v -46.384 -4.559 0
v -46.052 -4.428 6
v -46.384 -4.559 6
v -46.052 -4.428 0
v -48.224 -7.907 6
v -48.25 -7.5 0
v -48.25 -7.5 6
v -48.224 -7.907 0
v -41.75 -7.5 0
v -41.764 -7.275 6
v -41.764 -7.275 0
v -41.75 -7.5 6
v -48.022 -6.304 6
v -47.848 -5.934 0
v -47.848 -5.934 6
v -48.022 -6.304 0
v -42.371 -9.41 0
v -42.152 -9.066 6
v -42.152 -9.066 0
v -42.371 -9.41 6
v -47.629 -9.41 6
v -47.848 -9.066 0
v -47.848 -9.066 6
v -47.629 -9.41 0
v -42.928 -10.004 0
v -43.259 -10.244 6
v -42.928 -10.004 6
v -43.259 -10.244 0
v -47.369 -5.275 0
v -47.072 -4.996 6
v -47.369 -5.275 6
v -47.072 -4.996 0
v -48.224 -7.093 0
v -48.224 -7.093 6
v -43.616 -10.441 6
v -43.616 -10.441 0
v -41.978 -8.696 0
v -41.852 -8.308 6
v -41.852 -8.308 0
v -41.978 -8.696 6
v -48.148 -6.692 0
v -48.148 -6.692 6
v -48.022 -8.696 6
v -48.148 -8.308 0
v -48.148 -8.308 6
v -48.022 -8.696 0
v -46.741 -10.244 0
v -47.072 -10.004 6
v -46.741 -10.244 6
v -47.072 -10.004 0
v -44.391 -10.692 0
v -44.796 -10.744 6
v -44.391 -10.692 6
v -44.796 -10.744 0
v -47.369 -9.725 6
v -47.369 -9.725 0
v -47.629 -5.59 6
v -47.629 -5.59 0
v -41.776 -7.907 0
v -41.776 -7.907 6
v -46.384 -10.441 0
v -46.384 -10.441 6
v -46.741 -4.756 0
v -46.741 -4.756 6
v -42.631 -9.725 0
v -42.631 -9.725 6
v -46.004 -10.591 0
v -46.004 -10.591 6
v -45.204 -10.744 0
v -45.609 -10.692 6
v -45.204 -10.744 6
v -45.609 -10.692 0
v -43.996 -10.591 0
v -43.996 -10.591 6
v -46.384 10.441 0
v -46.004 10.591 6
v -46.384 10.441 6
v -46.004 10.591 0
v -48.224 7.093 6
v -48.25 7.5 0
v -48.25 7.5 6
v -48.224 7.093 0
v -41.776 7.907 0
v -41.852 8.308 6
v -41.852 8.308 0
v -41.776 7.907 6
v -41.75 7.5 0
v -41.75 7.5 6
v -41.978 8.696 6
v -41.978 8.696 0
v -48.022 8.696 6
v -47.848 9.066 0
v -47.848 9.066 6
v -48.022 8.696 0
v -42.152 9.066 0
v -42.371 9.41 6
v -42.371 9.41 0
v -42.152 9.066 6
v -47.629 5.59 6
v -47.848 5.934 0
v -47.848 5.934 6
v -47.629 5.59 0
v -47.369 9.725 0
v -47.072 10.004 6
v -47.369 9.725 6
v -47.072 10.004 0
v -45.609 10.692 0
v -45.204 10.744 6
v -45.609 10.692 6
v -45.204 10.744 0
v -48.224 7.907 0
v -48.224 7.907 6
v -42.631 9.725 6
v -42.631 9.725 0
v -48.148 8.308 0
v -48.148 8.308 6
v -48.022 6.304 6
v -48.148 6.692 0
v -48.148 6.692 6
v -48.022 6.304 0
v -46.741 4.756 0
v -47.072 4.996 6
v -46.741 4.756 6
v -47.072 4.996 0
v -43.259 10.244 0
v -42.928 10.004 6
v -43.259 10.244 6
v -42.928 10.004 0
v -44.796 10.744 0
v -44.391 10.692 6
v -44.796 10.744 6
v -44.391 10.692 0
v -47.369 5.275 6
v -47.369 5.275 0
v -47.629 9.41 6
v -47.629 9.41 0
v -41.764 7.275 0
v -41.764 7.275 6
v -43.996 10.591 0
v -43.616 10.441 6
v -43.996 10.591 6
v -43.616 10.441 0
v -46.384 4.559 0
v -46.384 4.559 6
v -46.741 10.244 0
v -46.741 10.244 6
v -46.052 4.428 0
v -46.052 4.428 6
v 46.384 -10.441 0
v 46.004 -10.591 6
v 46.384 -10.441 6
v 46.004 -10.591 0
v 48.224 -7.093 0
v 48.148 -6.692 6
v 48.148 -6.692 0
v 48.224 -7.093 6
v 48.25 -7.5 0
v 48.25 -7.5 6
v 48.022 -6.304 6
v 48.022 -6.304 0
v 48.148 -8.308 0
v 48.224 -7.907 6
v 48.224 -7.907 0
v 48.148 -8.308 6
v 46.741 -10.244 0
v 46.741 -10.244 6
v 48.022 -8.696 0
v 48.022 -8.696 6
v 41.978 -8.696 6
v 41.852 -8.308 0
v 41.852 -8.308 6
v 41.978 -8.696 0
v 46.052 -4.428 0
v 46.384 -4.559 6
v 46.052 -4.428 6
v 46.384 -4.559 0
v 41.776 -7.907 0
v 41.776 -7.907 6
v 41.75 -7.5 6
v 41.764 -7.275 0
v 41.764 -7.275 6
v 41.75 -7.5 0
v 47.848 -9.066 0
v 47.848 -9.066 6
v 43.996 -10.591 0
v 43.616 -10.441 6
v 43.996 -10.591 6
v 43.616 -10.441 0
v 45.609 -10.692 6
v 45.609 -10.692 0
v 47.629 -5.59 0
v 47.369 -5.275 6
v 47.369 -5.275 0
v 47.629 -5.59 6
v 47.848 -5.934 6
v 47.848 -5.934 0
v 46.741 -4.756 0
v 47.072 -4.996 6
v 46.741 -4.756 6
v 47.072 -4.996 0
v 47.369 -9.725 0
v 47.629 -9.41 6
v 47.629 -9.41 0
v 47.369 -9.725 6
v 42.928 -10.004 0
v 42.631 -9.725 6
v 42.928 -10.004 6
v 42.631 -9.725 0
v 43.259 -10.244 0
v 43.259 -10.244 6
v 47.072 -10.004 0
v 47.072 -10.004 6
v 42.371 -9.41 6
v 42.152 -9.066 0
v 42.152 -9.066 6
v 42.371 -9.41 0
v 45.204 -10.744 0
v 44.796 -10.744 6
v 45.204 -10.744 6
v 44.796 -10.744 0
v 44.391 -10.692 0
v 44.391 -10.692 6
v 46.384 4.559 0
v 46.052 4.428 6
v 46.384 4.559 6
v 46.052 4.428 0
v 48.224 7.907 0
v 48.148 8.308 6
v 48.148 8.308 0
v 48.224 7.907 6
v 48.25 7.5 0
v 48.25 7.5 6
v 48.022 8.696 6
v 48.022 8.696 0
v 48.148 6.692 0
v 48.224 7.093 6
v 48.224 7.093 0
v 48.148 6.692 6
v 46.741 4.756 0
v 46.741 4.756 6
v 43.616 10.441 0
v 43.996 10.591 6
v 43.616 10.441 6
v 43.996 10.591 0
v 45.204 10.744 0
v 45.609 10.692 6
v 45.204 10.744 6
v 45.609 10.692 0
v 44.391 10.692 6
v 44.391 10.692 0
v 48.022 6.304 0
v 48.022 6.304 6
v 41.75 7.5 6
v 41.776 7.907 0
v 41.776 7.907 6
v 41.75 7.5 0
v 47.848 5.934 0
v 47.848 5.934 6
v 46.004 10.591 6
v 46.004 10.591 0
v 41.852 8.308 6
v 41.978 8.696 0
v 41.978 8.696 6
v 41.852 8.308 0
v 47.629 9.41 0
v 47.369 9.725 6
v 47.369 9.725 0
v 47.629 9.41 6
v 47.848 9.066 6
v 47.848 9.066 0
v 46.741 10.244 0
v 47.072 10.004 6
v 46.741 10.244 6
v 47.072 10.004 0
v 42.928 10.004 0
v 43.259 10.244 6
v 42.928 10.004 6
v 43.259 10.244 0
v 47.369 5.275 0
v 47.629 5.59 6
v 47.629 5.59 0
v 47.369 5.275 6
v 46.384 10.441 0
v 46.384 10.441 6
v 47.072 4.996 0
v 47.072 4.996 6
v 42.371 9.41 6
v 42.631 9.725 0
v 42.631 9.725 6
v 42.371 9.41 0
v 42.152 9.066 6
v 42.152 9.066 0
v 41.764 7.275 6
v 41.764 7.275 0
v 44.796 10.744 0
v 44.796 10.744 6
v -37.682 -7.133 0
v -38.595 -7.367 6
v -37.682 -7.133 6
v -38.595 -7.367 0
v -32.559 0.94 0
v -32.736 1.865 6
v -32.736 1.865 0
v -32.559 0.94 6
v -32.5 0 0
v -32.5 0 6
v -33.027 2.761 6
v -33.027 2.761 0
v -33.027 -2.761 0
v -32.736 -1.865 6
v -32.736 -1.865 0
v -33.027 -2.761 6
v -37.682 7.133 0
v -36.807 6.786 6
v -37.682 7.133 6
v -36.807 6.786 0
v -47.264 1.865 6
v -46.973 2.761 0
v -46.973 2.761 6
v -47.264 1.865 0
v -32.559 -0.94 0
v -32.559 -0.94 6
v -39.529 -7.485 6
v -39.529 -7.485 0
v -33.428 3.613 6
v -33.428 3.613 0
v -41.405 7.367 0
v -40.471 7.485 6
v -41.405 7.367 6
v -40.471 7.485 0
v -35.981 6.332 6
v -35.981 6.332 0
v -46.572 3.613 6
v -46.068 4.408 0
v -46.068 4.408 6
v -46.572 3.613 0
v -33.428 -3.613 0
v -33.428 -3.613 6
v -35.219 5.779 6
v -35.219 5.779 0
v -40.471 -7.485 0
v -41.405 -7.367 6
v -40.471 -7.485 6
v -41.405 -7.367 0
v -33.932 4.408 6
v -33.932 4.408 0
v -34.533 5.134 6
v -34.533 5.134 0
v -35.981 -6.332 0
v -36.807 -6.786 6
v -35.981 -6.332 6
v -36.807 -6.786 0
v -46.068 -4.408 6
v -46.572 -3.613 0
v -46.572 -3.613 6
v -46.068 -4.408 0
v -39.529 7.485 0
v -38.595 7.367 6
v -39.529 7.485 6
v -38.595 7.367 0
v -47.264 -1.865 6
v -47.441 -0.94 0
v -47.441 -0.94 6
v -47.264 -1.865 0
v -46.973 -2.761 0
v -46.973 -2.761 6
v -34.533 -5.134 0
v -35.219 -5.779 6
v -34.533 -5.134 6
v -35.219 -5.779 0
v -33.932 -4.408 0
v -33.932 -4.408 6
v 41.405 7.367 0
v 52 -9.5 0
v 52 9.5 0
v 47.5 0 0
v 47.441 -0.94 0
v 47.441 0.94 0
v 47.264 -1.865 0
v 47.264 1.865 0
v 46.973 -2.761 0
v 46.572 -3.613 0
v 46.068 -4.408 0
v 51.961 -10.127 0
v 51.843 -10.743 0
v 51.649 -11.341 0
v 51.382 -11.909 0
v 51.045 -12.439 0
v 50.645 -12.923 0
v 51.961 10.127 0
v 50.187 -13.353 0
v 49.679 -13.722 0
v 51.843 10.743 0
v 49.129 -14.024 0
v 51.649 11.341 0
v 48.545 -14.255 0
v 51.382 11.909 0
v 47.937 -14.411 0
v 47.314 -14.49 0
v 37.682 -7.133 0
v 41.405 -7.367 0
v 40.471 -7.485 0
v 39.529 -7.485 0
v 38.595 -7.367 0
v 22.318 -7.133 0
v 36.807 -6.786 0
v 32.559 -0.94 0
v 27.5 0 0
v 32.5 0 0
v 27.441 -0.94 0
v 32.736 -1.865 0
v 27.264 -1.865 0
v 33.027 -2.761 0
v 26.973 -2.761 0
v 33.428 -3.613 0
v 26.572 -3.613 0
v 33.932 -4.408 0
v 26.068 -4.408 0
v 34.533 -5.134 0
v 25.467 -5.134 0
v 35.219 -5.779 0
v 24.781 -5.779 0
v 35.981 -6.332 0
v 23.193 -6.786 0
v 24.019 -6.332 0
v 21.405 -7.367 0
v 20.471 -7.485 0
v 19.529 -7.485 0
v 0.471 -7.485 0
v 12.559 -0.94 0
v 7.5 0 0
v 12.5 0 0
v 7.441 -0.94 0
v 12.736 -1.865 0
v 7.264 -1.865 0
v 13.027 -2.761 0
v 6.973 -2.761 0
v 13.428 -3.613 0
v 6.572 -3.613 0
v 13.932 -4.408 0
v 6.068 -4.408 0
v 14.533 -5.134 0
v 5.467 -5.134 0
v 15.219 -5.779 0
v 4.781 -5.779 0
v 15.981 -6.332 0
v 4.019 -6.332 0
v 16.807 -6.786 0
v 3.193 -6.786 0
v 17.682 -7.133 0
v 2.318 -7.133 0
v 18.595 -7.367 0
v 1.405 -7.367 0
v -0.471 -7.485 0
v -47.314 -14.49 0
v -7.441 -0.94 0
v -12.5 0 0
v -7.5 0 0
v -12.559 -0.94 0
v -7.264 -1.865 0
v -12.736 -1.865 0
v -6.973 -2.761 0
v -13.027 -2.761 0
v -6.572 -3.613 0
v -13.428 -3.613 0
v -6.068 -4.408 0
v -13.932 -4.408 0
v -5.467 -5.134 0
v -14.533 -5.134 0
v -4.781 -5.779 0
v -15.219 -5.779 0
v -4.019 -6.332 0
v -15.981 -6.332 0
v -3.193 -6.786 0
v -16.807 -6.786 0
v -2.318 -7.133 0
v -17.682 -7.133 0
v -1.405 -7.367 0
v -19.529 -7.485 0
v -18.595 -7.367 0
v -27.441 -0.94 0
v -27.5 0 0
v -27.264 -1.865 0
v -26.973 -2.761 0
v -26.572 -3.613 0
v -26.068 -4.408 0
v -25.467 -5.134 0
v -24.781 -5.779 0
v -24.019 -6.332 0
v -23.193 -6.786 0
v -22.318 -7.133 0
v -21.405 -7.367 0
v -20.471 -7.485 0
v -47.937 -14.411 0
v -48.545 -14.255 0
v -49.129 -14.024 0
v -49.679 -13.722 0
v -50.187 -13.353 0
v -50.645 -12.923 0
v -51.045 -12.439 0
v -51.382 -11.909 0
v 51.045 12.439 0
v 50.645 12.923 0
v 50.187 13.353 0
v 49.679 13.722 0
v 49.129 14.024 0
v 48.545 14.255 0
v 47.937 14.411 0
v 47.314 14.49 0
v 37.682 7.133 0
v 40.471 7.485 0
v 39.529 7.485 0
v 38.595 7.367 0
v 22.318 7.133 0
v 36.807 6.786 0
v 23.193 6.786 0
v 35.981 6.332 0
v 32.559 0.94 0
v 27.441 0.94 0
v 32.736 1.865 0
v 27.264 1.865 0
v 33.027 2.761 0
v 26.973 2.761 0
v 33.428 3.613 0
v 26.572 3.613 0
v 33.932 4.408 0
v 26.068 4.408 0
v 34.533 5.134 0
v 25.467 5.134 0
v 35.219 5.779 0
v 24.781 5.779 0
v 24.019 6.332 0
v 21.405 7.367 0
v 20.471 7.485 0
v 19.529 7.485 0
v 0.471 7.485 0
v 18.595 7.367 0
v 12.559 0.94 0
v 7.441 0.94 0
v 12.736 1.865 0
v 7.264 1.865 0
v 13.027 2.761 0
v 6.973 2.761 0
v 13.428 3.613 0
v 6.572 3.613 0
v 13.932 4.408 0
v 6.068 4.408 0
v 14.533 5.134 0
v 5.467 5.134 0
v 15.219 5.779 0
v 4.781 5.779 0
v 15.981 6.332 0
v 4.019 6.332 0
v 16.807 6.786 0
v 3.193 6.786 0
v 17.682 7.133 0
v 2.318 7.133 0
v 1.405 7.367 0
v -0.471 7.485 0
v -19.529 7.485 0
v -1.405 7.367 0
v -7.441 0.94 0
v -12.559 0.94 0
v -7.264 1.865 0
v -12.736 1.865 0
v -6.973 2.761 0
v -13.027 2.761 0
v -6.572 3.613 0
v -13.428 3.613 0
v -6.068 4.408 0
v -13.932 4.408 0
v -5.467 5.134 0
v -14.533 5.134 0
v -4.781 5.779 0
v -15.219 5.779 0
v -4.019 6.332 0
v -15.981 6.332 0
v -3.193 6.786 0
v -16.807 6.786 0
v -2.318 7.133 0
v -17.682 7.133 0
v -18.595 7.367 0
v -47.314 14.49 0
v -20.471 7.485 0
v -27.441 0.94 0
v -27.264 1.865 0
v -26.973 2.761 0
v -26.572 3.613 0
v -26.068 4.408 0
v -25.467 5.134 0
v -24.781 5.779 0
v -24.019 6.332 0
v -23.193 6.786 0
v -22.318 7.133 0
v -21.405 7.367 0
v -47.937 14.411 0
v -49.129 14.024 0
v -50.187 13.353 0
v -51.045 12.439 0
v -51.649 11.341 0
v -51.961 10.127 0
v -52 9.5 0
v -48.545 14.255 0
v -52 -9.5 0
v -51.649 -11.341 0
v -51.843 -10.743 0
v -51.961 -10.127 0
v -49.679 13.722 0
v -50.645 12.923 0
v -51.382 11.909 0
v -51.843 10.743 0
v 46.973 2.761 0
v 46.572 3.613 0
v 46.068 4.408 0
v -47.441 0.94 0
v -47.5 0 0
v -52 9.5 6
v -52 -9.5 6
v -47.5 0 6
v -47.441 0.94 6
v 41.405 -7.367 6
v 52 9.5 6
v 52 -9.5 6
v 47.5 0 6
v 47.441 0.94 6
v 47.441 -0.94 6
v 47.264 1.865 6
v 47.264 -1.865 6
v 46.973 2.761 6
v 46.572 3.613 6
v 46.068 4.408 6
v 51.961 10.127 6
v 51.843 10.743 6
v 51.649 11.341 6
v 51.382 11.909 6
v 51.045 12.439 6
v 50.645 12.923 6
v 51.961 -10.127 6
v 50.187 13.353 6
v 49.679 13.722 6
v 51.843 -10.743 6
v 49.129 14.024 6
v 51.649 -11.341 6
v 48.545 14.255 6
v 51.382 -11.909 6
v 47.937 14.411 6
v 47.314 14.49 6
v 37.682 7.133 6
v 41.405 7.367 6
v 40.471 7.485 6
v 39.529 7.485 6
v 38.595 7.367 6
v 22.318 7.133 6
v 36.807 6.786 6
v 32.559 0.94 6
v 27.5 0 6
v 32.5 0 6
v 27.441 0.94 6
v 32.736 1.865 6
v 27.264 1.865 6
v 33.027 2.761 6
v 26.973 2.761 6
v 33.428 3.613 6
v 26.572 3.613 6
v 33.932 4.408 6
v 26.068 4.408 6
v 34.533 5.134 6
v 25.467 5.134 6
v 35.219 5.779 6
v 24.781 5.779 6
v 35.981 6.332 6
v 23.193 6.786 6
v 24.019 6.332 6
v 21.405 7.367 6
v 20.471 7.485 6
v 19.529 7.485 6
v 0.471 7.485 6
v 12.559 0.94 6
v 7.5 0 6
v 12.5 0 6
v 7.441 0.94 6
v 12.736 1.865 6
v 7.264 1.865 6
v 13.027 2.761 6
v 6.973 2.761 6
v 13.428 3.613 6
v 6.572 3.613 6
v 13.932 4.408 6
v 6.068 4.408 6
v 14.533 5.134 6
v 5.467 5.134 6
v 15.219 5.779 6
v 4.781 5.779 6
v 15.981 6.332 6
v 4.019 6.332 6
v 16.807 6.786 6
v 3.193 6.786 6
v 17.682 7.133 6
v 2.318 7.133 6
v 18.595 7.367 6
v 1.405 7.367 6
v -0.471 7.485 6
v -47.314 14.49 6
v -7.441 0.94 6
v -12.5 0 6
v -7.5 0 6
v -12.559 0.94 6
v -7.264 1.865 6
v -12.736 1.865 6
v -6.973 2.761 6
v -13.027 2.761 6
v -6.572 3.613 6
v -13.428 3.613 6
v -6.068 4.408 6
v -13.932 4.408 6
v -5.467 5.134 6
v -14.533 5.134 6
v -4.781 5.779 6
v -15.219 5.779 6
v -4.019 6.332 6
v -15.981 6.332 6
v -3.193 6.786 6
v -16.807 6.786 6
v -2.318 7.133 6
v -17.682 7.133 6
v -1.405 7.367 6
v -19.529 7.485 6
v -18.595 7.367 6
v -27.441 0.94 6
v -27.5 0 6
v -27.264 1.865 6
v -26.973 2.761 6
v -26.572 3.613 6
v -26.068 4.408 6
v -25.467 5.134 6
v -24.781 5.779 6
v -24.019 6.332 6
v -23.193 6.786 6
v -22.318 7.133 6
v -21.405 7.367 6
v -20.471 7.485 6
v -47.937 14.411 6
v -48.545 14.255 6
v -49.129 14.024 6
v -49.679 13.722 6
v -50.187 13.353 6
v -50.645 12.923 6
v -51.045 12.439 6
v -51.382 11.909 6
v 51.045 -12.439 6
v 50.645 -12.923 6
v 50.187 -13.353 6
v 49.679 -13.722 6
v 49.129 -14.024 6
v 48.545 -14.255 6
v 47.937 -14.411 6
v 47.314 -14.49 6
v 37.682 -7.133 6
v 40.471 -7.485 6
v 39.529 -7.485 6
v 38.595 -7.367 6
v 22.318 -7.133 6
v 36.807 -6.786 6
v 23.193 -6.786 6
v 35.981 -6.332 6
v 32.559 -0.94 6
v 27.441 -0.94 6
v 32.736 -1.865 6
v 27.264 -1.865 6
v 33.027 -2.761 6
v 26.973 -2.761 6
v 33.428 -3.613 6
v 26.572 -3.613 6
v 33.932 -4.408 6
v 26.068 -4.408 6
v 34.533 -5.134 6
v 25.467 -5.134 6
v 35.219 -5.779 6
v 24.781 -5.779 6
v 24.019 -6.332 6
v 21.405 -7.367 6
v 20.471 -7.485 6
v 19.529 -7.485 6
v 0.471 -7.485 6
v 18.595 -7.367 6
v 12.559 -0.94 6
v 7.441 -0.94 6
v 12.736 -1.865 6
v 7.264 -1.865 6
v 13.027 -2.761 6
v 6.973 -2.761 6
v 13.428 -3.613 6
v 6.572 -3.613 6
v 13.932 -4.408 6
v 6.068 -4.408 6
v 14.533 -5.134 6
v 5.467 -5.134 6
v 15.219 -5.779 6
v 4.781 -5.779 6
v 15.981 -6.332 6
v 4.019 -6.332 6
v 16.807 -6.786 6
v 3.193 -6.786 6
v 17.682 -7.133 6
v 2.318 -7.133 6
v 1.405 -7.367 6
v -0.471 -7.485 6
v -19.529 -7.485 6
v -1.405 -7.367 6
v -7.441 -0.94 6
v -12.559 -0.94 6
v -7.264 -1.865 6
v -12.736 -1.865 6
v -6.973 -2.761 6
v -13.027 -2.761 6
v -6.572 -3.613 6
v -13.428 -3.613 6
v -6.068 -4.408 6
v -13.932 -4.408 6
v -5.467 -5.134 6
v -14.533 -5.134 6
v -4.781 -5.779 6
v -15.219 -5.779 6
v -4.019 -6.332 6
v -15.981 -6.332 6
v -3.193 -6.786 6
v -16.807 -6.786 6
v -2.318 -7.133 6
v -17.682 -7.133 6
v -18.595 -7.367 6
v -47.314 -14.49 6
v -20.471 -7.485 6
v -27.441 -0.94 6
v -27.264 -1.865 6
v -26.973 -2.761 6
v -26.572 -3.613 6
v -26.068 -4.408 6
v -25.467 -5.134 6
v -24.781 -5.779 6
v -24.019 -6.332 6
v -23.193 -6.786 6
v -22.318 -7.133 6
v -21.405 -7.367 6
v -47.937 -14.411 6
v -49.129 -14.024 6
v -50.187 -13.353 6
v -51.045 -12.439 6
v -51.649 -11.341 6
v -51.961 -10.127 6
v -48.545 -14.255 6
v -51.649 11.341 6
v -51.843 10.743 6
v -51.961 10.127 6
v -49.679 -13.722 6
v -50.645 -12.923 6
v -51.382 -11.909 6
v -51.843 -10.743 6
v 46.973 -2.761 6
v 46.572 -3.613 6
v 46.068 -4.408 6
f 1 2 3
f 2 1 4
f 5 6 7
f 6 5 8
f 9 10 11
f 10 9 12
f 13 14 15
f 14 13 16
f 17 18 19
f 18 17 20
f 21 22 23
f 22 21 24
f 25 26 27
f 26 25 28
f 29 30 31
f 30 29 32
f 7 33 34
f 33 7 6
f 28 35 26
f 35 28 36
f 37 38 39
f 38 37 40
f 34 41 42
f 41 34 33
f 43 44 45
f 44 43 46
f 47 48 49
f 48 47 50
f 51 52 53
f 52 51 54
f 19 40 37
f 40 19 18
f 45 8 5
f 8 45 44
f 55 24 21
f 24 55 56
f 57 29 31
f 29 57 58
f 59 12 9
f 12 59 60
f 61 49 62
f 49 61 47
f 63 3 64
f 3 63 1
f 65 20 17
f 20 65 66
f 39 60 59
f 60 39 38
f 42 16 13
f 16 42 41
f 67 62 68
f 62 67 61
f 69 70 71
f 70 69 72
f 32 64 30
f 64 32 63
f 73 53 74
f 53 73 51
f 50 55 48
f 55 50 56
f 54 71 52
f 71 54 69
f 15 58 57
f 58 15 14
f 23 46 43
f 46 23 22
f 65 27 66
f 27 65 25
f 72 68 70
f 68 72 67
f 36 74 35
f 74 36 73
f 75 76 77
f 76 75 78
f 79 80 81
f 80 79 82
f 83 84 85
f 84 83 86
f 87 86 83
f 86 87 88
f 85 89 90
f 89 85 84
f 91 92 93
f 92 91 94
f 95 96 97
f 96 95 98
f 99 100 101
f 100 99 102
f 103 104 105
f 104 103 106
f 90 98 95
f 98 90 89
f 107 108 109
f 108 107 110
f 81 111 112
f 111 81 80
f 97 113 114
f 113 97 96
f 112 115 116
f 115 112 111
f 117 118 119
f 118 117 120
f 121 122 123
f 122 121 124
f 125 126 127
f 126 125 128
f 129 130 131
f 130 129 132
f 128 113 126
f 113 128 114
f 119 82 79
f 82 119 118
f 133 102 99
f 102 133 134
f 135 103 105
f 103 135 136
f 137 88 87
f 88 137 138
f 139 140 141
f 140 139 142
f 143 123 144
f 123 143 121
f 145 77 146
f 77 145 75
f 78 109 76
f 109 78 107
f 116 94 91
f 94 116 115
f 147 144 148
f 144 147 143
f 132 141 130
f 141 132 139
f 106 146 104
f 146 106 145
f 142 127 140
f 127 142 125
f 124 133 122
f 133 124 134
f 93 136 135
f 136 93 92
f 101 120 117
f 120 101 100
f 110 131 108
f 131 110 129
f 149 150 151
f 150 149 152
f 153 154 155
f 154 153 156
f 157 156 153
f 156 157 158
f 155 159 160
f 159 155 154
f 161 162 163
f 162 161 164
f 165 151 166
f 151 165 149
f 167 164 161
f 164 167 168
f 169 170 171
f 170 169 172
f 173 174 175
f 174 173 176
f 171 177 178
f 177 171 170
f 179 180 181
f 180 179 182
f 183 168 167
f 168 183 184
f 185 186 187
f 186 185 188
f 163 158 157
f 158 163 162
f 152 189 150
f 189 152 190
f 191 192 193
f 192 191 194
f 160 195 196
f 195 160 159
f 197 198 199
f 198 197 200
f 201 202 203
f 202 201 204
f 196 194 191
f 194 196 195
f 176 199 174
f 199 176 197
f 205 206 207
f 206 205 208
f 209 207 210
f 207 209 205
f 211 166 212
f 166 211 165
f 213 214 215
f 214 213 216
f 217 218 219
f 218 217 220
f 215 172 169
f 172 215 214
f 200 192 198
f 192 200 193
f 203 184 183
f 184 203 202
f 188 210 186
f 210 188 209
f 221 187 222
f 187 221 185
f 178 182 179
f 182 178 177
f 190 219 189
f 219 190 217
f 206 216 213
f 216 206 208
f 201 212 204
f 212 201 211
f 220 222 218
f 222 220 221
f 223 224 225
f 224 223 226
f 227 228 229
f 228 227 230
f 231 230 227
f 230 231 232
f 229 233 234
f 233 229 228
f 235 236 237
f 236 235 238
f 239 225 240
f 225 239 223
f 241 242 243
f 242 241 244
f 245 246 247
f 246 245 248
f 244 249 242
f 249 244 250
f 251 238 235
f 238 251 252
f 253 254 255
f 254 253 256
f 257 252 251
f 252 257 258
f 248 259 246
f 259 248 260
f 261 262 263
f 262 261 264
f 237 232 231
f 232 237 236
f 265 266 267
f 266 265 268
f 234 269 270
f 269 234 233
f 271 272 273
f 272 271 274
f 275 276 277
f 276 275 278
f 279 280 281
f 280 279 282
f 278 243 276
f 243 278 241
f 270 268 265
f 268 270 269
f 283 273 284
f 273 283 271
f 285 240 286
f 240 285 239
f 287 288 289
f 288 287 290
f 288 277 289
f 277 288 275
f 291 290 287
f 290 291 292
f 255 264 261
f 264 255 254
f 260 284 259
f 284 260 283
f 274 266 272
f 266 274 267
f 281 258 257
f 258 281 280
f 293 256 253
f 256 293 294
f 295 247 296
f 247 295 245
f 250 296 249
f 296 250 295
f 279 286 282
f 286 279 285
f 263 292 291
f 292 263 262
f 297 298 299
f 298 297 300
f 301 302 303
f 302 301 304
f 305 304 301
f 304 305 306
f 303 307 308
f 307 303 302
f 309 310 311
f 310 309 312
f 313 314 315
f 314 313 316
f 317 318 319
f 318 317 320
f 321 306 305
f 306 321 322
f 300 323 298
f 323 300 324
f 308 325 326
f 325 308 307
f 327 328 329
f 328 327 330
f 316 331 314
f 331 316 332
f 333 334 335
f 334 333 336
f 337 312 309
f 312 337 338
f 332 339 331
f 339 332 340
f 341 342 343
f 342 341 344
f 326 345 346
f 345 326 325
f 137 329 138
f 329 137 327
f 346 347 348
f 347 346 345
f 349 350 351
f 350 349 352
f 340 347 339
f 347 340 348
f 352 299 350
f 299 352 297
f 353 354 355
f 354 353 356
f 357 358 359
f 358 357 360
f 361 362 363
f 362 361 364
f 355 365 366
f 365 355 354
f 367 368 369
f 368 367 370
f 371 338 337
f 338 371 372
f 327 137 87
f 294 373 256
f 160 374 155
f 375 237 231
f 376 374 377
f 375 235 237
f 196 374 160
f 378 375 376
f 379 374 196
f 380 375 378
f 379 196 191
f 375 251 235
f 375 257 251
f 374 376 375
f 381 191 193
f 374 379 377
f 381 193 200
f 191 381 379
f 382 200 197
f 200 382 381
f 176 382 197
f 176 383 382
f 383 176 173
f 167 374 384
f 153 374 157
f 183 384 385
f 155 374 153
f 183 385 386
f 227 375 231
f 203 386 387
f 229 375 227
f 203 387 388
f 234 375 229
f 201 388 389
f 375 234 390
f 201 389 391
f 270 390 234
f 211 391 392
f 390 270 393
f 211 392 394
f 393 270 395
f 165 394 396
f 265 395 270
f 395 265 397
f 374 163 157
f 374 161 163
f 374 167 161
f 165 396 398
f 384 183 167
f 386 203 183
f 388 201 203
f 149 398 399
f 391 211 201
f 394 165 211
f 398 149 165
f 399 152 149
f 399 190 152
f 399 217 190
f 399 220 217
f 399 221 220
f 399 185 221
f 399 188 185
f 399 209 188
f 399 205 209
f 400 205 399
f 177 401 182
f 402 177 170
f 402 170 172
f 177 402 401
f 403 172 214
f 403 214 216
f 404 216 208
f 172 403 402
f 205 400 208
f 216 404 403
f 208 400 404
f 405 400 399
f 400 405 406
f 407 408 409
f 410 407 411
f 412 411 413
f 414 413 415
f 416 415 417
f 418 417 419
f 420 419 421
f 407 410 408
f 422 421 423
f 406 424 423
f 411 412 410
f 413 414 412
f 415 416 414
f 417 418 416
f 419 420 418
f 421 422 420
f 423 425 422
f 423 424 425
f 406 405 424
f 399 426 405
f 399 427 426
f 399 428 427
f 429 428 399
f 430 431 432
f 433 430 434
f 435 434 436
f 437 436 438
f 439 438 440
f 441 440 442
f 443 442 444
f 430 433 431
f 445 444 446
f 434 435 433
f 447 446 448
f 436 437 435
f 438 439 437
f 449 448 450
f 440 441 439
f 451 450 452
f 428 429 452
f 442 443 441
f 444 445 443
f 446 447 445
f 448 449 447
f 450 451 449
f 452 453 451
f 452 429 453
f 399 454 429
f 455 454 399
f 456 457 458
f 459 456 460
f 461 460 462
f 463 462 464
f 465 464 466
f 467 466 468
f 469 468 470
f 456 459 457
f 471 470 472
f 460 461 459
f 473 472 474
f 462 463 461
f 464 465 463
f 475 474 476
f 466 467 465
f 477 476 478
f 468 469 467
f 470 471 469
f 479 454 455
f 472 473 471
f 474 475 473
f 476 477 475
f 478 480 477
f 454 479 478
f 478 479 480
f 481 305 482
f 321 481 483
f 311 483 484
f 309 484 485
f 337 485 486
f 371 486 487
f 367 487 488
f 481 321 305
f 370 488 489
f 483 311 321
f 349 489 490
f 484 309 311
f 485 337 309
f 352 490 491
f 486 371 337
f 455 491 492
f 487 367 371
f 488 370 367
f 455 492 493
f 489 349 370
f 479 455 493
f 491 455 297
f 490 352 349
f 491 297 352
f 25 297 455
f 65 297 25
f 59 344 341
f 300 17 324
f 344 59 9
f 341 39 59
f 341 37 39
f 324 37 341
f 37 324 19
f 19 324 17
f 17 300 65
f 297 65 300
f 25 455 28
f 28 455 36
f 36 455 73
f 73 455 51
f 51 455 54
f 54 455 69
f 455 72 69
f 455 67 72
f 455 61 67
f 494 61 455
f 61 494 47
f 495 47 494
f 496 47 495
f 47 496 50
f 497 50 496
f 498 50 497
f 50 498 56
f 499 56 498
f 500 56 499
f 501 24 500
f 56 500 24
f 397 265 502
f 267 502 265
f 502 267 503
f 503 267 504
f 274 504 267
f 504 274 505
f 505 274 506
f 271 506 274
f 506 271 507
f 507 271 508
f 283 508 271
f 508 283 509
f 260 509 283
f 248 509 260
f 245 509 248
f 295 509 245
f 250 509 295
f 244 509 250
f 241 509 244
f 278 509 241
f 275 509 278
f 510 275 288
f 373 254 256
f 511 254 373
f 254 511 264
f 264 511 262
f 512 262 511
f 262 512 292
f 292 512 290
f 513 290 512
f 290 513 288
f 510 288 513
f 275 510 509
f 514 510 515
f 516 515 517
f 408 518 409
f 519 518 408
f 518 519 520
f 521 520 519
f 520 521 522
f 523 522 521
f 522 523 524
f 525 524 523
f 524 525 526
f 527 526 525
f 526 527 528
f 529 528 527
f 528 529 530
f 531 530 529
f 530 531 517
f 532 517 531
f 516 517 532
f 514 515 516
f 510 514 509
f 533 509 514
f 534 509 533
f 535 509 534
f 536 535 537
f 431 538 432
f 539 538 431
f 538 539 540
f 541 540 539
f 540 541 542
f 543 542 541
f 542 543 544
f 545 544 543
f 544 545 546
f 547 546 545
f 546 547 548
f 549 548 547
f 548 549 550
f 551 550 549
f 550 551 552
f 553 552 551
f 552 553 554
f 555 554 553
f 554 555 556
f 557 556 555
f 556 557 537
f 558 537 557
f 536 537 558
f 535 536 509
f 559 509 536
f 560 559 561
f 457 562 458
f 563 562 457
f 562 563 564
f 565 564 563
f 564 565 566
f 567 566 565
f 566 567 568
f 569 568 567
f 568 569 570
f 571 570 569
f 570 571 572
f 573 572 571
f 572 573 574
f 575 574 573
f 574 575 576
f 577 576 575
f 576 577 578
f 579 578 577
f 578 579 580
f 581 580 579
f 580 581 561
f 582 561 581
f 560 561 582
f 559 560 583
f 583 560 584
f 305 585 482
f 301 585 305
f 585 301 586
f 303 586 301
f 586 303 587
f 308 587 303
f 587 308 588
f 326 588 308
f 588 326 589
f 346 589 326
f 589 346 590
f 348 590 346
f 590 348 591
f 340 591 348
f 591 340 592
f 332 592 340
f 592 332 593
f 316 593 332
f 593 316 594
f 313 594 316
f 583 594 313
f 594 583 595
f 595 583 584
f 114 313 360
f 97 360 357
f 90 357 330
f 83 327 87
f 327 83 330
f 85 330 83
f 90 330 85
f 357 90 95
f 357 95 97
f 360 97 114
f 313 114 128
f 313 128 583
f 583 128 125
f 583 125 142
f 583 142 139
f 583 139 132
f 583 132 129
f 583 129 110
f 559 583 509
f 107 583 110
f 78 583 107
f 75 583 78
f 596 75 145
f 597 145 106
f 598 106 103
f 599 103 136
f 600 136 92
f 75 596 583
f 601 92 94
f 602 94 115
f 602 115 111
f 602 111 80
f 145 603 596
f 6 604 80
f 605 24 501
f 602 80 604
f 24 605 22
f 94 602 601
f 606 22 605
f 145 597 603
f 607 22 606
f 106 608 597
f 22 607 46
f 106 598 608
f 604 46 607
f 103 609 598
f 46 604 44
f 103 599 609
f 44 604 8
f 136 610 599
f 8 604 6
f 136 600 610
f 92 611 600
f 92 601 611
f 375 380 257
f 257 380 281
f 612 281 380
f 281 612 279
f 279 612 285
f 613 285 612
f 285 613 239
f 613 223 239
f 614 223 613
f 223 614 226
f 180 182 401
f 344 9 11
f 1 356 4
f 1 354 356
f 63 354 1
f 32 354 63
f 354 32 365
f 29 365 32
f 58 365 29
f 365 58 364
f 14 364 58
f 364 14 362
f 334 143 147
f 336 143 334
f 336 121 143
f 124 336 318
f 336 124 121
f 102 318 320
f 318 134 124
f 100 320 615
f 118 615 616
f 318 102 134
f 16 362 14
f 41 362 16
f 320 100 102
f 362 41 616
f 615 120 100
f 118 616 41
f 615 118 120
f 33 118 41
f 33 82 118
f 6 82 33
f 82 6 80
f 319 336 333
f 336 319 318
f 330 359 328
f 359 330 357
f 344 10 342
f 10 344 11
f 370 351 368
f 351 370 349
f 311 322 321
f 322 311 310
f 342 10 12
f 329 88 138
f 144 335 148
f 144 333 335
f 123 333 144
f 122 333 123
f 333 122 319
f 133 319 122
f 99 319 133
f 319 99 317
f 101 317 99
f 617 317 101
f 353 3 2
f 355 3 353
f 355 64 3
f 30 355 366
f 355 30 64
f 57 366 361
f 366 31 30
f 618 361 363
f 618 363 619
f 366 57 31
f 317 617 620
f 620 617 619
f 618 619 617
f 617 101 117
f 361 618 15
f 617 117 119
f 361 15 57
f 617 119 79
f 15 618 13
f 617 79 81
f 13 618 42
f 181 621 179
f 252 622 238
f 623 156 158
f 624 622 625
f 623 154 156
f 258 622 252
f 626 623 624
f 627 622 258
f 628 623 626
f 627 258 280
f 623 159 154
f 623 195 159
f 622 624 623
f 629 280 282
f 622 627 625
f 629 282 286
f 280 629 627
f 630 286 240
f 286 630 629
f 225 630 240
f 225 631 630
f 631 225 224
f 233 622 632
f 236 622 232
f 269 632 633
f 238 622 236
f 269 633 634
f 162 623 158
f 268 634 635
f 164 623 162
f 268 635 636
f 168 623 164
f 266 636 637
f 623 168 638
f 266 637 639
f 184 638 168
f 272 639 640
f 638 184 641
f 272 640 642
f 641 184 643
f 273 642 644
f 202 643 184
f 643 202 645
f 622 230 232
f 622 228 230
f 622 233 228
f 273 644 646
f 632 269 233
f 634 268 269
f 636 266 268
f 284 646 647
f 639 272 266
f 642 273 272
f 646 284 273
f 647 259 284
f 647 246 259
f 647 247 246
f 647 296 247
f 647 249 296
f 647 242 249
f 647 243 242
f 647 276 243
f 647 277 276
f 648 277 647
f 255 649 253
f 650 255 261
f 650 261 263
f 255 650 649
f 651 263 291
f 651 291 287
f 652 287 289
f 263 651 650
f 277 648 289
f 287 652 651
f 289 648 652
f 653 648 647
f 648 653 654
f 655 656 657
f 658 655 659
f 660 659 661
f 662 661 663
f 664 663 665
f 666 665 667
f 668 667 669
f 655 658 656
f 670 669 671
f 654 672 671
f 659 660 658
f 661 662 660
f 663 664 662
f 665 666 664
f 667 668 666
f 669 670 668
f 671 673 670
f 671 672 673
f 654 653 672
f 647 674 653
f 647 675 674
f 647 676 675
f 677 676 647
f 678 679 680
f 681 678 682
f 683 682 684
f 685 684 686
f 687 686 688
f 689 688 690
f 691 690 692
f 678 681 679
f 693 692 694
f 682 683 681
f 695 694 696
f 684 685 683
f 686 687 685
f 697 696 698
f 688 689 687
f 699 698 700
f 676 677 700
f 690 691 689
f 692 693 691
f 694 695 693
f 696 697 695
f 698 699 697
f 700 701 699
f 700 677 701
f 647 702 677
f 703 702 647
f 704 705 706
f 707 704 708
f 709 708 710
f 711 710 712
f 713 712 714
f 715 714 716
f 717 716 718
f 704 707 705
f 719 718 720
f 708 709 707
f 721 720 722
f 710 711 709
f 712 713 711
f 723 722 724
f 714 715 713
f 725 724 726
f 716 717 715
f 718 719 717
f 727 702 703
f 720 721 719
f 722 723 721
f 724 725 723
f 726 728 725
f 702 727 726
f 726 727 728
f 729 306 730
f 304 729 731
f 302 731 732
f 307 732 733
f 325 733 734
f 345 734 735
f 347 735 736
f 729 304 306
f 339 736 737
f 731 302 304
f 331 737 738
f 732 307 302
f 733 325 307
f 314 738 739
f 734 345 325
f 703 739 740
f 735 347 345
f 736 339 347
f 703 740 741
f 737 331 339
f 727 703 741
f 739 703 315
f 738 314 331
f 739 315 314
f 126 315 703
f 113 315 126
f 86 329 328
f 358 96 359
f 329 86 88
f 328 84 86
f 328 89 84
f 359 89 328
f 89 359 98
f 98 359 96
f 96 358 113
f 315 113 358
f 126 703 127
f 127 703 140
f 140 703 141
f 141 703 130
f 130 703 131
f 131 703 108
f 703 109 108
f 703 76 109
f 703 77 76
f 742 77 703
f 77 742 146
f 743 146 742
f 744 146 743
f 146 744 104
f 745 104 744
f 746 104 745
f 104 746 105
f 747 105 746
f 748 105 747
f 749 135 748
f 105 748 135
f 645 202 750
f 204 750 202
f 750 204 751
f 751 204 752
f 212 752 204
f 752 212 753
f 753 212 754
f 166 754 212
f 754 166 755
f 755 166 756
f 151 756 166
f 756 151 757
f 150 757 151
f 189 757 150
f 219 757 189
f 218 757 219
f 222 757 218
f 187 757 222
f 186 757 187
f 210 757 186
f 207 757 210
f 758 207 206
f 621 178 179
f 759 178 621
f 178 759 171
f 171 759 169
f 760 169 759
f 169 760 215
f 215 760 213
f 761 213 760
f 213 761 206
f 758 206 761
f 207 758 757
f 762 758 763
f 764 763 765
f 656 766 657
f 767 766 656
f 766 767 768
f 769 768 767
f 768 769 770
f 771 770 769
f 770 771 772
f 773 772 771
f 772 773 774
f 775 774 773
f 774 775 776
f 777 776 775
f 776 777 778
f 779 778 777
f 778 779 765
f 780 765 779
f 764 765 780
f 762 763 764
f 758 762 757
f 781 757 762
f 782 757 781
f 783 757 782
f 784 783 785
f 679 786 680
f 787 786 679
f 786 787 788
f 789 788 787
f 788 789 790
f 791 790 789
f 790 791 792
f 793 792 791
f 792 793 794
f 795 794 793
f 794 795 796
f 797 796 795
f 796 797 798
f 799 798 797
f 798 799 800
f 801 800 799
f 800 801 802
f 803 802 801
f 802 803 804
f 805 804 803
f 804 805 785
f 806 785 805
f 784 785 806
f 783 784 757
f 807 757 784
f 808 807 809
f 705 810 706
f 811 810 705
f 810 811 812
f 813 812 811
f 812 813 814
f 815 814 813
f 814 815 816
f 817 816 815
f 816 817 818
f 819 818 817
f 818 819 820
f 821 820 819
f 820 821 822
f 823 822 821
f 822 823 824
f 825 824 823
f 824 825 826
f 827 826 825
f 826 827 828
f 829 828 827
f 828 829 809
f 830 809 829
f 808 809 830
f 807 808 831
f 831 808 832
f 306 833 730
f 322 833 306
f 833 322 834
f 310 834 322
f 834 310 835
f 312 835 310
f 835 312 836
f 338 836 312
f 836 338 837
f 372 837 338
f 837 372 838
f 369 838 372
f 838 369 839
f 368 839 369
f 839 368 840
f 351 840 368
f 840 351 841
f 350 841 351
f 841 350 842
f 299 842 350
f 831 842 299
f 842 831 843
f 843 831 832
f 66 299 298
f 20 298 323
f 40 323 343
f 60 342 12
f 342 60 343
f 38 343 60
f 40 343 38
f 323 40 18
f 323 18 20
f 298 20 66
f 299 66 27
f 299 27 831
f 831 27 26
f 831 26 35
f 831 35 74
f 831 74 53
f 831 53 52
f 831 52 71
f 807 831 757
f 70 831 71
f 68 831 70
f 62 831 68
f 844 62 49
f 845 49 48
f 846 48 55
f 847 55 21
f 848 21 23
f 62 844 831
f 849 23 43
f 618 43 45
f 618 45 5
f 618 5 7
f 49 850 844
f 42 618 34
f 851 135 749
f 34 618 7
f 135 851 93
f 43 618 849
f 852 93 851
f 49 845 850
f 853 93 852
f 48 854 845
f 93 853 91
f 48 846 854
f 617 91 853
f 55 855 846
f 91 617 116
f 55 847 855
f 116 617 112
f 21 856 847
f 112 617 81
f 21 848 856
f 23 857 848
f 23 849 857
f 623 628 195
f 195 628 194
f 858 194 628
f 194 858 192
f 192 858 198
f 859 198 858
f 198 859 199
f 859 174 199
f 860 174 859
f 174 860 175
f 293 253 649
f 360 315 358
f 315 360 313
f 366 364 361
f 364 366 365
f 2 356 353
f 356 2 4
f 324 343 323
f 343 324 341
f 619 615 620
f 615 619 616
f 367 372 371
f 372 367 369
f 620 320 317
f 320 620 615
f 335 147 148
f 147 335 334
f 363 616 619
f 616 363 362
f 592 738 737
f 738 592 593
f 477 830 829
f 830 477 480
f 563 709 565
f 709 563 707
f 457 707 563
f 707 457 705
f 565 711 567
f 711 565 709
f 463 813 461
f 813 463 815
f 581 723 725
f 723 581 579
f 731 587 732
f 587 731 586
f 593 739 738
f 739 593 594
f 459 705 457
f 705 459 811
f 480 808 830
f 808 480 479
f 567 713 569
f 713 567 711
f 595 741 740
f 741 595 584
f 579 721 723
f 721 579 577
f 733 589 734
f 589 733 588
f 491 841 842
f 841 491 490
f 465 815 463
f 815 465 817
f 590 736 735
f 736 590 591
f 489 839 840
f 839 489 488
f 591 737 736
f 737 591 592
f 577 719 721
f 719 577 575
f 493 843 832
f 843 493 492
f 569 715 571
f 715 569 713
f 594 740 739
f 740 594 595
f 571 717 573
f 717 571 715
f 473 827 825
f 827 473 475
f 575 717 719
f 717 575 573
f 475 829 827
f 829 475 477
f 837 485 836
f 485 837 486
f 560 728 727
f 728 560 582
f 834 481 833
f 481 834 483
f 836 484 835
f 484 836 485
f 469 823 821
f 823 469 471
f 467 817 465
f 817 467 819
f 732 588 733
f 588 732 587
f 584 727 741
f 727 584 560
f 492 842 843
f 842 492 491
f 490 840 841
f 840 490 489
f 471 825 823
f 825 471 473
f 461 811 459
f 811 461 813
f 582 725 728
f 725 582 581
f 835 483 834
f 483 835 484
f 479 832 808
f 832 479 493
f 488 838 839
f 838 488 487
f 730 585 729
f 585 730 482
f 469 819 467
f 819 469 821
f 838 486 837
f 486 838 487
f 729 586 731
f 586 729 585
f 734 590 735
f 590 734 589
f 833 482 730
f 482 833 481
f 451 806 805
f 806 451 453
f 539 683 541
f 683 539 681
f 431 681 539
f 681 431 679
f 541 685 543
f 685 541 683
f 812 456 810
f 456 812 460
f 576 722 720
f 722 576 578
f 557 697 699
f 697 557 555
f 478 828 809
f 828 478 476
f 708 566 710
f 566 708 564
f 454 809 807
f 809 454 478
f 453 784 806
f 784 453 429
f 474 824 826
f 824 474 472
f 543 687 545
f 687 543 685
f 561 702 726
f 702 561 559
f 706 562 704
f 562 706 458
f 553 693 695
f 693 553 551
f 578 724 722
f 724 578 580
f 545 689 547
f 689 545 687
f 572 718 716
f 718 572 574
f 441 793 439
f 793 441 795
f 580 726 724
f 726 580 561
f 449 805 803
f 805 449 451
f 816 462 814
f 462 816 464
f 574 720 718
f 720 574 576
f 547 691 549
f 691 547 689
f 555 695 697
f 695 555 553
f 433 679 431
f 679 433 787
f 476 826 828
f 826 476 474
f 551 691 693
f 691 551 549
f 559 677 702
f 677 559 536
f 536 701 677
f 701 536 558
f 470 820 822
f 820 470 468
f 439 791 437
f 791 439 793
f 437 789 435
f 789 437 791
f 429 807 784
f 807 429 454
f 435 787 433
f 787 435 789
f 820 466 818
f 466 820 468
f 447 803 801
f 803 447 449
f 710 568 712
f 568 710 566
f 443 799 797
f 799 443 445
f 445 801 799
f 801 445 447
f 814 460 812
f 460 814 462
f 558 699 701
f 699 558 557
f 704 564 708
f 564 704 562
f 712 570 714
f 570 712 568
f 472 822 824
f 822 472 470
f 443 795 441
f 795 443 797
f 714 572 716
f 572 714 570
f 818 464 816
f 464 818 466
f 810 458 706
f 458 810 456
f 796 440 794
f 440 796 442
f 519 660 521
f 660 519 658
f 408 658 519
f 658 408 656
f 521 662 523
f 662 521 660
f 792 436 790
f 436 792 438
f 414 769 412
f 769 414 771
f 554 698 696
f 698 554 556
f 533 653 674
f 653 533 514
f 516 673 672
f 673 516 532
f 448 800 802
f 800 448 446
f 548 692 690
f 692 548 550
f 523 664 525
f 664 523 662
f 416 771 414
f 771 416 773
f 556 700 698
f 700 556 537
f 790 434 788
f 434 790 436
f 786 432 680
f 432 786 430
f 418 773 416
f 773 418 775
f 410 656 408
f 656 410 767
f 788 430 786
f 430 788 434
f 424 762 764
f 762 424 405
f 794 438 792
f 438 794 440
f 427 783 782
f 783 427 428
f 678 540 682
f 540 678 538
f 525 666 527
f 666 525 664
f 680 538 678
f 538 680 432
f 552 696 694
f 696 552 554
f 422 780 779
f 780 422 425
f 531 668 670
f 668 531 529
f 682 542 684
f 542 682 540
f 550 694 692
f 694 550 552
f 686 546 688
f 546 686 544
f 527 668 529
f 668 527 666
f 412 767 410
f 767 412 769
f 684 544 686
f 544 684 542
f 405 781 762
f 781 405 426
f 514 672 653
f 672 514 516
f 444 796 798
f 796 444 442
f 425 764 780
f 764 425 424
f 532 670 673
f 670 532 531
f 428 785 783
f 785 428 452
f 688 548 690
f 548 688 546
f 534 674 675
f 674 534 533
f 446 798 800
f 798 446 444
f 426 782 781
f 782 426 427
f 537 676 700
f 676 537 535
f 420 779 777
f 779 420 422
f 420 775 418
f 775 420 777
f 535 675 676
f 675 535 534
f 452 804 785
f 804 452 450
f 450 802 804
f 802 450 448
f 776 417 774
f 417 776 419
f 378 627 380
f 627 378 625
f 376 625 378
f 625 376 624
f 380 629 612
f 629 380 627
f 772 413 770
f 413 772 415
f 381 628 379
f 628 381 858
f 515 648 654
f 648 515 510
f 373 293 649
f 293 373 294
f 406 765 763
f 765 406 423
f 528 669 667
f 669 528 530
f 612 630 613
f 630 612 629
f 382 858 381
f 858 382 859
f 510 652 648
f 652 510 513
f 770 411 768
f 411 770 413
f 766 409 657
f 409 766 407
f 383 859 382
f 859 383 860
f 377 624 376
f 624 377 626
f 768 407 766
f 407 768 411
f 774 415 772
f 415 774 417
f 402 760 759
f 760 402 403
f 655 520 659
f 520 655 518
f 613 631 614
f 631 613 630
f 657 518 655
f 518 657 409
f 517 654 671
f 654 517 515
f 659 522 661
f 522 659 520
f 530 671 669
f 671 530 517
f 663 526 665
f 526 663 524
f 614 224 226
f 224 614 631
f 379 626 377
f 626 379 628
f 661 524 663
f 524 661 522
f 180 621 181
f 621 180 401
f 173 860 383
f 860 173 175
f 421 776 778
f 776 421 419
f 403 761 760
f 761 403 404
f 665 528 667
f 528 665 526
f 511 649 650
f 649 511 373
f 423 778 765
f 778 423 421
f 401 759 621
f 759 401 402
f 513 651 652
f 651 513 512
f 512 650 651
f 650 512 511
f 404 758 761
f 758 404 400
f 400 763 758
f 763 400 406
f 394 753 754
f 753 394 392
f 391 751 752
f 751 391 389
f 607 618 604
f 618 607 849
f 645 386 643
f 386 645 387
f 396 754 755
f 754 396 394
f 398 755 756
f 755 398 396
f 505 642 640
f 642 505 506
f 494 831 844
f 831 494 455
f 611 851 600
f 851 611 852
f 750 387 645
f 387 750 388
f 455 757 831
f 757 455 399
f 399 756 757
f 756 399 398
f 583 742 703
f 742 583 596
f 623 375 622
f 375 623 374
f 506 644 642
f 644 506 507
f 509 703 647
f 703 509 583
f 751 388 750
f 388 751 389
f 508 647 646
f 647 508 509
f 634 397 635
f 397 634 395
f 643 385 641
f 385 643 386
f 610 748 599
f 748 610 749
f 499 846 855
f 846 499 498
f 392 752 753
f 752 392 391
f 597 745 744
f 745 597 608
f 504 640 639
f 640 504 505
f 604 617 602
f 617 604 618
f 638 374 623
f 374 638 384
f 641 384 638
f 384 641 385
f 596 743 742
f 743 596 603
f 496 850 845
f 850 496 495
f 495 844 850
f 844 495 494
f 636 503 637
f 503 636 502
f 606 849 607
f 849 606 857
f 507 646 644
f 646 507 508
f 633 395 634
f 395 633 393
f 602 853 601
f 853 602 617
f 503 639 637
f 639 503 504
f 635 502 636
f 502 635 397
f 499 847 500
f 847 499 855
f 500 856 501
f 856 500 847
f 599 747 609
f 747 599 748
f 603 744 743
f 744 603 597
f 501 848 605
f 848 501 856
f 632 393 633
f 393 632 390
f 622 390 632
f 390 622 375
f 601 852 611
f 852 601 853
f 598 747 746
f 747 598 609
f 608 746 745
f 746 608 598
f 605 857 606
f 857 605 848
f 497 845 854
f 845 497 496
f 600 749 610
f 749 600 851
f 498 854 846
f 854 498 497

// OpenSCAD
$fn = 50;

difference() {
	union() {
		hull() {
			translate(v = [-47.0, 9.5, 0]) {
				cylinder(h = 6, r = 5);
			}
			translate(v = [47.0, 9.5, 0]) {
				cylinder(h = 6, r = 5);
			}
			translate(v = [-47.0, -9.5, 0]) {
				cylinder(h = 6, r = 5);
			}
			translate(v = [47.0, -9.5, 0]) {
				cylinder(h = 6, r = 5);
			}
		}
	}
	union() {
		translate(v = [-45.0, -7.5, -100.0]) {
			cylinder(h = 200, r = 3.25);
		}
		translate(v = [-45.0, 7.5, -100.0]) {
			cylinder(h = 200, r = 3.25);
		}
		translate(v = [45.0, -7.5, -100.0]) {
			cylinder(h = 200, r = 3.25);
		}
		translate(v = [45.0, 7.5, -100.0]) {
			cylinder(h = 200, r = 3.25);
		}
		translate(v = [-45.0, -7.5, -100.0]) {
			cylinder(h = 200, r = 1.8);
		}
		translate(v = [-45.0, 7.5, -100.0]) {
			cylinder(h = 200, r = 1.8);
		}
		translate(v = [45.0, -7.5, -100.0]) {
			cylinder(h = 200, r = 1.8);
		}
		translate(v = [45.0, 7.5, -100.0]) {
			cylinder(h = 200, r = 1.8);
		}
		translate(v = [-40.0, 0, 0.0]) {
			cylinder(h = 6, r = 7.5);
		}
		translate(v = [-20.0, 0, 0.0]) {
			cylinder(h = 6, r = 7.5);
		}
		cylinder(h = 6, r = 7.5);
		translate(v = [20.0, 0, 0.0]) {
			cylinder(h = 6, r = 7.5);
		}
		translate(v = [40.0, 0, 0.0]) {
			cylinder(h = 6, r = 7.5);
		}
	}
}
